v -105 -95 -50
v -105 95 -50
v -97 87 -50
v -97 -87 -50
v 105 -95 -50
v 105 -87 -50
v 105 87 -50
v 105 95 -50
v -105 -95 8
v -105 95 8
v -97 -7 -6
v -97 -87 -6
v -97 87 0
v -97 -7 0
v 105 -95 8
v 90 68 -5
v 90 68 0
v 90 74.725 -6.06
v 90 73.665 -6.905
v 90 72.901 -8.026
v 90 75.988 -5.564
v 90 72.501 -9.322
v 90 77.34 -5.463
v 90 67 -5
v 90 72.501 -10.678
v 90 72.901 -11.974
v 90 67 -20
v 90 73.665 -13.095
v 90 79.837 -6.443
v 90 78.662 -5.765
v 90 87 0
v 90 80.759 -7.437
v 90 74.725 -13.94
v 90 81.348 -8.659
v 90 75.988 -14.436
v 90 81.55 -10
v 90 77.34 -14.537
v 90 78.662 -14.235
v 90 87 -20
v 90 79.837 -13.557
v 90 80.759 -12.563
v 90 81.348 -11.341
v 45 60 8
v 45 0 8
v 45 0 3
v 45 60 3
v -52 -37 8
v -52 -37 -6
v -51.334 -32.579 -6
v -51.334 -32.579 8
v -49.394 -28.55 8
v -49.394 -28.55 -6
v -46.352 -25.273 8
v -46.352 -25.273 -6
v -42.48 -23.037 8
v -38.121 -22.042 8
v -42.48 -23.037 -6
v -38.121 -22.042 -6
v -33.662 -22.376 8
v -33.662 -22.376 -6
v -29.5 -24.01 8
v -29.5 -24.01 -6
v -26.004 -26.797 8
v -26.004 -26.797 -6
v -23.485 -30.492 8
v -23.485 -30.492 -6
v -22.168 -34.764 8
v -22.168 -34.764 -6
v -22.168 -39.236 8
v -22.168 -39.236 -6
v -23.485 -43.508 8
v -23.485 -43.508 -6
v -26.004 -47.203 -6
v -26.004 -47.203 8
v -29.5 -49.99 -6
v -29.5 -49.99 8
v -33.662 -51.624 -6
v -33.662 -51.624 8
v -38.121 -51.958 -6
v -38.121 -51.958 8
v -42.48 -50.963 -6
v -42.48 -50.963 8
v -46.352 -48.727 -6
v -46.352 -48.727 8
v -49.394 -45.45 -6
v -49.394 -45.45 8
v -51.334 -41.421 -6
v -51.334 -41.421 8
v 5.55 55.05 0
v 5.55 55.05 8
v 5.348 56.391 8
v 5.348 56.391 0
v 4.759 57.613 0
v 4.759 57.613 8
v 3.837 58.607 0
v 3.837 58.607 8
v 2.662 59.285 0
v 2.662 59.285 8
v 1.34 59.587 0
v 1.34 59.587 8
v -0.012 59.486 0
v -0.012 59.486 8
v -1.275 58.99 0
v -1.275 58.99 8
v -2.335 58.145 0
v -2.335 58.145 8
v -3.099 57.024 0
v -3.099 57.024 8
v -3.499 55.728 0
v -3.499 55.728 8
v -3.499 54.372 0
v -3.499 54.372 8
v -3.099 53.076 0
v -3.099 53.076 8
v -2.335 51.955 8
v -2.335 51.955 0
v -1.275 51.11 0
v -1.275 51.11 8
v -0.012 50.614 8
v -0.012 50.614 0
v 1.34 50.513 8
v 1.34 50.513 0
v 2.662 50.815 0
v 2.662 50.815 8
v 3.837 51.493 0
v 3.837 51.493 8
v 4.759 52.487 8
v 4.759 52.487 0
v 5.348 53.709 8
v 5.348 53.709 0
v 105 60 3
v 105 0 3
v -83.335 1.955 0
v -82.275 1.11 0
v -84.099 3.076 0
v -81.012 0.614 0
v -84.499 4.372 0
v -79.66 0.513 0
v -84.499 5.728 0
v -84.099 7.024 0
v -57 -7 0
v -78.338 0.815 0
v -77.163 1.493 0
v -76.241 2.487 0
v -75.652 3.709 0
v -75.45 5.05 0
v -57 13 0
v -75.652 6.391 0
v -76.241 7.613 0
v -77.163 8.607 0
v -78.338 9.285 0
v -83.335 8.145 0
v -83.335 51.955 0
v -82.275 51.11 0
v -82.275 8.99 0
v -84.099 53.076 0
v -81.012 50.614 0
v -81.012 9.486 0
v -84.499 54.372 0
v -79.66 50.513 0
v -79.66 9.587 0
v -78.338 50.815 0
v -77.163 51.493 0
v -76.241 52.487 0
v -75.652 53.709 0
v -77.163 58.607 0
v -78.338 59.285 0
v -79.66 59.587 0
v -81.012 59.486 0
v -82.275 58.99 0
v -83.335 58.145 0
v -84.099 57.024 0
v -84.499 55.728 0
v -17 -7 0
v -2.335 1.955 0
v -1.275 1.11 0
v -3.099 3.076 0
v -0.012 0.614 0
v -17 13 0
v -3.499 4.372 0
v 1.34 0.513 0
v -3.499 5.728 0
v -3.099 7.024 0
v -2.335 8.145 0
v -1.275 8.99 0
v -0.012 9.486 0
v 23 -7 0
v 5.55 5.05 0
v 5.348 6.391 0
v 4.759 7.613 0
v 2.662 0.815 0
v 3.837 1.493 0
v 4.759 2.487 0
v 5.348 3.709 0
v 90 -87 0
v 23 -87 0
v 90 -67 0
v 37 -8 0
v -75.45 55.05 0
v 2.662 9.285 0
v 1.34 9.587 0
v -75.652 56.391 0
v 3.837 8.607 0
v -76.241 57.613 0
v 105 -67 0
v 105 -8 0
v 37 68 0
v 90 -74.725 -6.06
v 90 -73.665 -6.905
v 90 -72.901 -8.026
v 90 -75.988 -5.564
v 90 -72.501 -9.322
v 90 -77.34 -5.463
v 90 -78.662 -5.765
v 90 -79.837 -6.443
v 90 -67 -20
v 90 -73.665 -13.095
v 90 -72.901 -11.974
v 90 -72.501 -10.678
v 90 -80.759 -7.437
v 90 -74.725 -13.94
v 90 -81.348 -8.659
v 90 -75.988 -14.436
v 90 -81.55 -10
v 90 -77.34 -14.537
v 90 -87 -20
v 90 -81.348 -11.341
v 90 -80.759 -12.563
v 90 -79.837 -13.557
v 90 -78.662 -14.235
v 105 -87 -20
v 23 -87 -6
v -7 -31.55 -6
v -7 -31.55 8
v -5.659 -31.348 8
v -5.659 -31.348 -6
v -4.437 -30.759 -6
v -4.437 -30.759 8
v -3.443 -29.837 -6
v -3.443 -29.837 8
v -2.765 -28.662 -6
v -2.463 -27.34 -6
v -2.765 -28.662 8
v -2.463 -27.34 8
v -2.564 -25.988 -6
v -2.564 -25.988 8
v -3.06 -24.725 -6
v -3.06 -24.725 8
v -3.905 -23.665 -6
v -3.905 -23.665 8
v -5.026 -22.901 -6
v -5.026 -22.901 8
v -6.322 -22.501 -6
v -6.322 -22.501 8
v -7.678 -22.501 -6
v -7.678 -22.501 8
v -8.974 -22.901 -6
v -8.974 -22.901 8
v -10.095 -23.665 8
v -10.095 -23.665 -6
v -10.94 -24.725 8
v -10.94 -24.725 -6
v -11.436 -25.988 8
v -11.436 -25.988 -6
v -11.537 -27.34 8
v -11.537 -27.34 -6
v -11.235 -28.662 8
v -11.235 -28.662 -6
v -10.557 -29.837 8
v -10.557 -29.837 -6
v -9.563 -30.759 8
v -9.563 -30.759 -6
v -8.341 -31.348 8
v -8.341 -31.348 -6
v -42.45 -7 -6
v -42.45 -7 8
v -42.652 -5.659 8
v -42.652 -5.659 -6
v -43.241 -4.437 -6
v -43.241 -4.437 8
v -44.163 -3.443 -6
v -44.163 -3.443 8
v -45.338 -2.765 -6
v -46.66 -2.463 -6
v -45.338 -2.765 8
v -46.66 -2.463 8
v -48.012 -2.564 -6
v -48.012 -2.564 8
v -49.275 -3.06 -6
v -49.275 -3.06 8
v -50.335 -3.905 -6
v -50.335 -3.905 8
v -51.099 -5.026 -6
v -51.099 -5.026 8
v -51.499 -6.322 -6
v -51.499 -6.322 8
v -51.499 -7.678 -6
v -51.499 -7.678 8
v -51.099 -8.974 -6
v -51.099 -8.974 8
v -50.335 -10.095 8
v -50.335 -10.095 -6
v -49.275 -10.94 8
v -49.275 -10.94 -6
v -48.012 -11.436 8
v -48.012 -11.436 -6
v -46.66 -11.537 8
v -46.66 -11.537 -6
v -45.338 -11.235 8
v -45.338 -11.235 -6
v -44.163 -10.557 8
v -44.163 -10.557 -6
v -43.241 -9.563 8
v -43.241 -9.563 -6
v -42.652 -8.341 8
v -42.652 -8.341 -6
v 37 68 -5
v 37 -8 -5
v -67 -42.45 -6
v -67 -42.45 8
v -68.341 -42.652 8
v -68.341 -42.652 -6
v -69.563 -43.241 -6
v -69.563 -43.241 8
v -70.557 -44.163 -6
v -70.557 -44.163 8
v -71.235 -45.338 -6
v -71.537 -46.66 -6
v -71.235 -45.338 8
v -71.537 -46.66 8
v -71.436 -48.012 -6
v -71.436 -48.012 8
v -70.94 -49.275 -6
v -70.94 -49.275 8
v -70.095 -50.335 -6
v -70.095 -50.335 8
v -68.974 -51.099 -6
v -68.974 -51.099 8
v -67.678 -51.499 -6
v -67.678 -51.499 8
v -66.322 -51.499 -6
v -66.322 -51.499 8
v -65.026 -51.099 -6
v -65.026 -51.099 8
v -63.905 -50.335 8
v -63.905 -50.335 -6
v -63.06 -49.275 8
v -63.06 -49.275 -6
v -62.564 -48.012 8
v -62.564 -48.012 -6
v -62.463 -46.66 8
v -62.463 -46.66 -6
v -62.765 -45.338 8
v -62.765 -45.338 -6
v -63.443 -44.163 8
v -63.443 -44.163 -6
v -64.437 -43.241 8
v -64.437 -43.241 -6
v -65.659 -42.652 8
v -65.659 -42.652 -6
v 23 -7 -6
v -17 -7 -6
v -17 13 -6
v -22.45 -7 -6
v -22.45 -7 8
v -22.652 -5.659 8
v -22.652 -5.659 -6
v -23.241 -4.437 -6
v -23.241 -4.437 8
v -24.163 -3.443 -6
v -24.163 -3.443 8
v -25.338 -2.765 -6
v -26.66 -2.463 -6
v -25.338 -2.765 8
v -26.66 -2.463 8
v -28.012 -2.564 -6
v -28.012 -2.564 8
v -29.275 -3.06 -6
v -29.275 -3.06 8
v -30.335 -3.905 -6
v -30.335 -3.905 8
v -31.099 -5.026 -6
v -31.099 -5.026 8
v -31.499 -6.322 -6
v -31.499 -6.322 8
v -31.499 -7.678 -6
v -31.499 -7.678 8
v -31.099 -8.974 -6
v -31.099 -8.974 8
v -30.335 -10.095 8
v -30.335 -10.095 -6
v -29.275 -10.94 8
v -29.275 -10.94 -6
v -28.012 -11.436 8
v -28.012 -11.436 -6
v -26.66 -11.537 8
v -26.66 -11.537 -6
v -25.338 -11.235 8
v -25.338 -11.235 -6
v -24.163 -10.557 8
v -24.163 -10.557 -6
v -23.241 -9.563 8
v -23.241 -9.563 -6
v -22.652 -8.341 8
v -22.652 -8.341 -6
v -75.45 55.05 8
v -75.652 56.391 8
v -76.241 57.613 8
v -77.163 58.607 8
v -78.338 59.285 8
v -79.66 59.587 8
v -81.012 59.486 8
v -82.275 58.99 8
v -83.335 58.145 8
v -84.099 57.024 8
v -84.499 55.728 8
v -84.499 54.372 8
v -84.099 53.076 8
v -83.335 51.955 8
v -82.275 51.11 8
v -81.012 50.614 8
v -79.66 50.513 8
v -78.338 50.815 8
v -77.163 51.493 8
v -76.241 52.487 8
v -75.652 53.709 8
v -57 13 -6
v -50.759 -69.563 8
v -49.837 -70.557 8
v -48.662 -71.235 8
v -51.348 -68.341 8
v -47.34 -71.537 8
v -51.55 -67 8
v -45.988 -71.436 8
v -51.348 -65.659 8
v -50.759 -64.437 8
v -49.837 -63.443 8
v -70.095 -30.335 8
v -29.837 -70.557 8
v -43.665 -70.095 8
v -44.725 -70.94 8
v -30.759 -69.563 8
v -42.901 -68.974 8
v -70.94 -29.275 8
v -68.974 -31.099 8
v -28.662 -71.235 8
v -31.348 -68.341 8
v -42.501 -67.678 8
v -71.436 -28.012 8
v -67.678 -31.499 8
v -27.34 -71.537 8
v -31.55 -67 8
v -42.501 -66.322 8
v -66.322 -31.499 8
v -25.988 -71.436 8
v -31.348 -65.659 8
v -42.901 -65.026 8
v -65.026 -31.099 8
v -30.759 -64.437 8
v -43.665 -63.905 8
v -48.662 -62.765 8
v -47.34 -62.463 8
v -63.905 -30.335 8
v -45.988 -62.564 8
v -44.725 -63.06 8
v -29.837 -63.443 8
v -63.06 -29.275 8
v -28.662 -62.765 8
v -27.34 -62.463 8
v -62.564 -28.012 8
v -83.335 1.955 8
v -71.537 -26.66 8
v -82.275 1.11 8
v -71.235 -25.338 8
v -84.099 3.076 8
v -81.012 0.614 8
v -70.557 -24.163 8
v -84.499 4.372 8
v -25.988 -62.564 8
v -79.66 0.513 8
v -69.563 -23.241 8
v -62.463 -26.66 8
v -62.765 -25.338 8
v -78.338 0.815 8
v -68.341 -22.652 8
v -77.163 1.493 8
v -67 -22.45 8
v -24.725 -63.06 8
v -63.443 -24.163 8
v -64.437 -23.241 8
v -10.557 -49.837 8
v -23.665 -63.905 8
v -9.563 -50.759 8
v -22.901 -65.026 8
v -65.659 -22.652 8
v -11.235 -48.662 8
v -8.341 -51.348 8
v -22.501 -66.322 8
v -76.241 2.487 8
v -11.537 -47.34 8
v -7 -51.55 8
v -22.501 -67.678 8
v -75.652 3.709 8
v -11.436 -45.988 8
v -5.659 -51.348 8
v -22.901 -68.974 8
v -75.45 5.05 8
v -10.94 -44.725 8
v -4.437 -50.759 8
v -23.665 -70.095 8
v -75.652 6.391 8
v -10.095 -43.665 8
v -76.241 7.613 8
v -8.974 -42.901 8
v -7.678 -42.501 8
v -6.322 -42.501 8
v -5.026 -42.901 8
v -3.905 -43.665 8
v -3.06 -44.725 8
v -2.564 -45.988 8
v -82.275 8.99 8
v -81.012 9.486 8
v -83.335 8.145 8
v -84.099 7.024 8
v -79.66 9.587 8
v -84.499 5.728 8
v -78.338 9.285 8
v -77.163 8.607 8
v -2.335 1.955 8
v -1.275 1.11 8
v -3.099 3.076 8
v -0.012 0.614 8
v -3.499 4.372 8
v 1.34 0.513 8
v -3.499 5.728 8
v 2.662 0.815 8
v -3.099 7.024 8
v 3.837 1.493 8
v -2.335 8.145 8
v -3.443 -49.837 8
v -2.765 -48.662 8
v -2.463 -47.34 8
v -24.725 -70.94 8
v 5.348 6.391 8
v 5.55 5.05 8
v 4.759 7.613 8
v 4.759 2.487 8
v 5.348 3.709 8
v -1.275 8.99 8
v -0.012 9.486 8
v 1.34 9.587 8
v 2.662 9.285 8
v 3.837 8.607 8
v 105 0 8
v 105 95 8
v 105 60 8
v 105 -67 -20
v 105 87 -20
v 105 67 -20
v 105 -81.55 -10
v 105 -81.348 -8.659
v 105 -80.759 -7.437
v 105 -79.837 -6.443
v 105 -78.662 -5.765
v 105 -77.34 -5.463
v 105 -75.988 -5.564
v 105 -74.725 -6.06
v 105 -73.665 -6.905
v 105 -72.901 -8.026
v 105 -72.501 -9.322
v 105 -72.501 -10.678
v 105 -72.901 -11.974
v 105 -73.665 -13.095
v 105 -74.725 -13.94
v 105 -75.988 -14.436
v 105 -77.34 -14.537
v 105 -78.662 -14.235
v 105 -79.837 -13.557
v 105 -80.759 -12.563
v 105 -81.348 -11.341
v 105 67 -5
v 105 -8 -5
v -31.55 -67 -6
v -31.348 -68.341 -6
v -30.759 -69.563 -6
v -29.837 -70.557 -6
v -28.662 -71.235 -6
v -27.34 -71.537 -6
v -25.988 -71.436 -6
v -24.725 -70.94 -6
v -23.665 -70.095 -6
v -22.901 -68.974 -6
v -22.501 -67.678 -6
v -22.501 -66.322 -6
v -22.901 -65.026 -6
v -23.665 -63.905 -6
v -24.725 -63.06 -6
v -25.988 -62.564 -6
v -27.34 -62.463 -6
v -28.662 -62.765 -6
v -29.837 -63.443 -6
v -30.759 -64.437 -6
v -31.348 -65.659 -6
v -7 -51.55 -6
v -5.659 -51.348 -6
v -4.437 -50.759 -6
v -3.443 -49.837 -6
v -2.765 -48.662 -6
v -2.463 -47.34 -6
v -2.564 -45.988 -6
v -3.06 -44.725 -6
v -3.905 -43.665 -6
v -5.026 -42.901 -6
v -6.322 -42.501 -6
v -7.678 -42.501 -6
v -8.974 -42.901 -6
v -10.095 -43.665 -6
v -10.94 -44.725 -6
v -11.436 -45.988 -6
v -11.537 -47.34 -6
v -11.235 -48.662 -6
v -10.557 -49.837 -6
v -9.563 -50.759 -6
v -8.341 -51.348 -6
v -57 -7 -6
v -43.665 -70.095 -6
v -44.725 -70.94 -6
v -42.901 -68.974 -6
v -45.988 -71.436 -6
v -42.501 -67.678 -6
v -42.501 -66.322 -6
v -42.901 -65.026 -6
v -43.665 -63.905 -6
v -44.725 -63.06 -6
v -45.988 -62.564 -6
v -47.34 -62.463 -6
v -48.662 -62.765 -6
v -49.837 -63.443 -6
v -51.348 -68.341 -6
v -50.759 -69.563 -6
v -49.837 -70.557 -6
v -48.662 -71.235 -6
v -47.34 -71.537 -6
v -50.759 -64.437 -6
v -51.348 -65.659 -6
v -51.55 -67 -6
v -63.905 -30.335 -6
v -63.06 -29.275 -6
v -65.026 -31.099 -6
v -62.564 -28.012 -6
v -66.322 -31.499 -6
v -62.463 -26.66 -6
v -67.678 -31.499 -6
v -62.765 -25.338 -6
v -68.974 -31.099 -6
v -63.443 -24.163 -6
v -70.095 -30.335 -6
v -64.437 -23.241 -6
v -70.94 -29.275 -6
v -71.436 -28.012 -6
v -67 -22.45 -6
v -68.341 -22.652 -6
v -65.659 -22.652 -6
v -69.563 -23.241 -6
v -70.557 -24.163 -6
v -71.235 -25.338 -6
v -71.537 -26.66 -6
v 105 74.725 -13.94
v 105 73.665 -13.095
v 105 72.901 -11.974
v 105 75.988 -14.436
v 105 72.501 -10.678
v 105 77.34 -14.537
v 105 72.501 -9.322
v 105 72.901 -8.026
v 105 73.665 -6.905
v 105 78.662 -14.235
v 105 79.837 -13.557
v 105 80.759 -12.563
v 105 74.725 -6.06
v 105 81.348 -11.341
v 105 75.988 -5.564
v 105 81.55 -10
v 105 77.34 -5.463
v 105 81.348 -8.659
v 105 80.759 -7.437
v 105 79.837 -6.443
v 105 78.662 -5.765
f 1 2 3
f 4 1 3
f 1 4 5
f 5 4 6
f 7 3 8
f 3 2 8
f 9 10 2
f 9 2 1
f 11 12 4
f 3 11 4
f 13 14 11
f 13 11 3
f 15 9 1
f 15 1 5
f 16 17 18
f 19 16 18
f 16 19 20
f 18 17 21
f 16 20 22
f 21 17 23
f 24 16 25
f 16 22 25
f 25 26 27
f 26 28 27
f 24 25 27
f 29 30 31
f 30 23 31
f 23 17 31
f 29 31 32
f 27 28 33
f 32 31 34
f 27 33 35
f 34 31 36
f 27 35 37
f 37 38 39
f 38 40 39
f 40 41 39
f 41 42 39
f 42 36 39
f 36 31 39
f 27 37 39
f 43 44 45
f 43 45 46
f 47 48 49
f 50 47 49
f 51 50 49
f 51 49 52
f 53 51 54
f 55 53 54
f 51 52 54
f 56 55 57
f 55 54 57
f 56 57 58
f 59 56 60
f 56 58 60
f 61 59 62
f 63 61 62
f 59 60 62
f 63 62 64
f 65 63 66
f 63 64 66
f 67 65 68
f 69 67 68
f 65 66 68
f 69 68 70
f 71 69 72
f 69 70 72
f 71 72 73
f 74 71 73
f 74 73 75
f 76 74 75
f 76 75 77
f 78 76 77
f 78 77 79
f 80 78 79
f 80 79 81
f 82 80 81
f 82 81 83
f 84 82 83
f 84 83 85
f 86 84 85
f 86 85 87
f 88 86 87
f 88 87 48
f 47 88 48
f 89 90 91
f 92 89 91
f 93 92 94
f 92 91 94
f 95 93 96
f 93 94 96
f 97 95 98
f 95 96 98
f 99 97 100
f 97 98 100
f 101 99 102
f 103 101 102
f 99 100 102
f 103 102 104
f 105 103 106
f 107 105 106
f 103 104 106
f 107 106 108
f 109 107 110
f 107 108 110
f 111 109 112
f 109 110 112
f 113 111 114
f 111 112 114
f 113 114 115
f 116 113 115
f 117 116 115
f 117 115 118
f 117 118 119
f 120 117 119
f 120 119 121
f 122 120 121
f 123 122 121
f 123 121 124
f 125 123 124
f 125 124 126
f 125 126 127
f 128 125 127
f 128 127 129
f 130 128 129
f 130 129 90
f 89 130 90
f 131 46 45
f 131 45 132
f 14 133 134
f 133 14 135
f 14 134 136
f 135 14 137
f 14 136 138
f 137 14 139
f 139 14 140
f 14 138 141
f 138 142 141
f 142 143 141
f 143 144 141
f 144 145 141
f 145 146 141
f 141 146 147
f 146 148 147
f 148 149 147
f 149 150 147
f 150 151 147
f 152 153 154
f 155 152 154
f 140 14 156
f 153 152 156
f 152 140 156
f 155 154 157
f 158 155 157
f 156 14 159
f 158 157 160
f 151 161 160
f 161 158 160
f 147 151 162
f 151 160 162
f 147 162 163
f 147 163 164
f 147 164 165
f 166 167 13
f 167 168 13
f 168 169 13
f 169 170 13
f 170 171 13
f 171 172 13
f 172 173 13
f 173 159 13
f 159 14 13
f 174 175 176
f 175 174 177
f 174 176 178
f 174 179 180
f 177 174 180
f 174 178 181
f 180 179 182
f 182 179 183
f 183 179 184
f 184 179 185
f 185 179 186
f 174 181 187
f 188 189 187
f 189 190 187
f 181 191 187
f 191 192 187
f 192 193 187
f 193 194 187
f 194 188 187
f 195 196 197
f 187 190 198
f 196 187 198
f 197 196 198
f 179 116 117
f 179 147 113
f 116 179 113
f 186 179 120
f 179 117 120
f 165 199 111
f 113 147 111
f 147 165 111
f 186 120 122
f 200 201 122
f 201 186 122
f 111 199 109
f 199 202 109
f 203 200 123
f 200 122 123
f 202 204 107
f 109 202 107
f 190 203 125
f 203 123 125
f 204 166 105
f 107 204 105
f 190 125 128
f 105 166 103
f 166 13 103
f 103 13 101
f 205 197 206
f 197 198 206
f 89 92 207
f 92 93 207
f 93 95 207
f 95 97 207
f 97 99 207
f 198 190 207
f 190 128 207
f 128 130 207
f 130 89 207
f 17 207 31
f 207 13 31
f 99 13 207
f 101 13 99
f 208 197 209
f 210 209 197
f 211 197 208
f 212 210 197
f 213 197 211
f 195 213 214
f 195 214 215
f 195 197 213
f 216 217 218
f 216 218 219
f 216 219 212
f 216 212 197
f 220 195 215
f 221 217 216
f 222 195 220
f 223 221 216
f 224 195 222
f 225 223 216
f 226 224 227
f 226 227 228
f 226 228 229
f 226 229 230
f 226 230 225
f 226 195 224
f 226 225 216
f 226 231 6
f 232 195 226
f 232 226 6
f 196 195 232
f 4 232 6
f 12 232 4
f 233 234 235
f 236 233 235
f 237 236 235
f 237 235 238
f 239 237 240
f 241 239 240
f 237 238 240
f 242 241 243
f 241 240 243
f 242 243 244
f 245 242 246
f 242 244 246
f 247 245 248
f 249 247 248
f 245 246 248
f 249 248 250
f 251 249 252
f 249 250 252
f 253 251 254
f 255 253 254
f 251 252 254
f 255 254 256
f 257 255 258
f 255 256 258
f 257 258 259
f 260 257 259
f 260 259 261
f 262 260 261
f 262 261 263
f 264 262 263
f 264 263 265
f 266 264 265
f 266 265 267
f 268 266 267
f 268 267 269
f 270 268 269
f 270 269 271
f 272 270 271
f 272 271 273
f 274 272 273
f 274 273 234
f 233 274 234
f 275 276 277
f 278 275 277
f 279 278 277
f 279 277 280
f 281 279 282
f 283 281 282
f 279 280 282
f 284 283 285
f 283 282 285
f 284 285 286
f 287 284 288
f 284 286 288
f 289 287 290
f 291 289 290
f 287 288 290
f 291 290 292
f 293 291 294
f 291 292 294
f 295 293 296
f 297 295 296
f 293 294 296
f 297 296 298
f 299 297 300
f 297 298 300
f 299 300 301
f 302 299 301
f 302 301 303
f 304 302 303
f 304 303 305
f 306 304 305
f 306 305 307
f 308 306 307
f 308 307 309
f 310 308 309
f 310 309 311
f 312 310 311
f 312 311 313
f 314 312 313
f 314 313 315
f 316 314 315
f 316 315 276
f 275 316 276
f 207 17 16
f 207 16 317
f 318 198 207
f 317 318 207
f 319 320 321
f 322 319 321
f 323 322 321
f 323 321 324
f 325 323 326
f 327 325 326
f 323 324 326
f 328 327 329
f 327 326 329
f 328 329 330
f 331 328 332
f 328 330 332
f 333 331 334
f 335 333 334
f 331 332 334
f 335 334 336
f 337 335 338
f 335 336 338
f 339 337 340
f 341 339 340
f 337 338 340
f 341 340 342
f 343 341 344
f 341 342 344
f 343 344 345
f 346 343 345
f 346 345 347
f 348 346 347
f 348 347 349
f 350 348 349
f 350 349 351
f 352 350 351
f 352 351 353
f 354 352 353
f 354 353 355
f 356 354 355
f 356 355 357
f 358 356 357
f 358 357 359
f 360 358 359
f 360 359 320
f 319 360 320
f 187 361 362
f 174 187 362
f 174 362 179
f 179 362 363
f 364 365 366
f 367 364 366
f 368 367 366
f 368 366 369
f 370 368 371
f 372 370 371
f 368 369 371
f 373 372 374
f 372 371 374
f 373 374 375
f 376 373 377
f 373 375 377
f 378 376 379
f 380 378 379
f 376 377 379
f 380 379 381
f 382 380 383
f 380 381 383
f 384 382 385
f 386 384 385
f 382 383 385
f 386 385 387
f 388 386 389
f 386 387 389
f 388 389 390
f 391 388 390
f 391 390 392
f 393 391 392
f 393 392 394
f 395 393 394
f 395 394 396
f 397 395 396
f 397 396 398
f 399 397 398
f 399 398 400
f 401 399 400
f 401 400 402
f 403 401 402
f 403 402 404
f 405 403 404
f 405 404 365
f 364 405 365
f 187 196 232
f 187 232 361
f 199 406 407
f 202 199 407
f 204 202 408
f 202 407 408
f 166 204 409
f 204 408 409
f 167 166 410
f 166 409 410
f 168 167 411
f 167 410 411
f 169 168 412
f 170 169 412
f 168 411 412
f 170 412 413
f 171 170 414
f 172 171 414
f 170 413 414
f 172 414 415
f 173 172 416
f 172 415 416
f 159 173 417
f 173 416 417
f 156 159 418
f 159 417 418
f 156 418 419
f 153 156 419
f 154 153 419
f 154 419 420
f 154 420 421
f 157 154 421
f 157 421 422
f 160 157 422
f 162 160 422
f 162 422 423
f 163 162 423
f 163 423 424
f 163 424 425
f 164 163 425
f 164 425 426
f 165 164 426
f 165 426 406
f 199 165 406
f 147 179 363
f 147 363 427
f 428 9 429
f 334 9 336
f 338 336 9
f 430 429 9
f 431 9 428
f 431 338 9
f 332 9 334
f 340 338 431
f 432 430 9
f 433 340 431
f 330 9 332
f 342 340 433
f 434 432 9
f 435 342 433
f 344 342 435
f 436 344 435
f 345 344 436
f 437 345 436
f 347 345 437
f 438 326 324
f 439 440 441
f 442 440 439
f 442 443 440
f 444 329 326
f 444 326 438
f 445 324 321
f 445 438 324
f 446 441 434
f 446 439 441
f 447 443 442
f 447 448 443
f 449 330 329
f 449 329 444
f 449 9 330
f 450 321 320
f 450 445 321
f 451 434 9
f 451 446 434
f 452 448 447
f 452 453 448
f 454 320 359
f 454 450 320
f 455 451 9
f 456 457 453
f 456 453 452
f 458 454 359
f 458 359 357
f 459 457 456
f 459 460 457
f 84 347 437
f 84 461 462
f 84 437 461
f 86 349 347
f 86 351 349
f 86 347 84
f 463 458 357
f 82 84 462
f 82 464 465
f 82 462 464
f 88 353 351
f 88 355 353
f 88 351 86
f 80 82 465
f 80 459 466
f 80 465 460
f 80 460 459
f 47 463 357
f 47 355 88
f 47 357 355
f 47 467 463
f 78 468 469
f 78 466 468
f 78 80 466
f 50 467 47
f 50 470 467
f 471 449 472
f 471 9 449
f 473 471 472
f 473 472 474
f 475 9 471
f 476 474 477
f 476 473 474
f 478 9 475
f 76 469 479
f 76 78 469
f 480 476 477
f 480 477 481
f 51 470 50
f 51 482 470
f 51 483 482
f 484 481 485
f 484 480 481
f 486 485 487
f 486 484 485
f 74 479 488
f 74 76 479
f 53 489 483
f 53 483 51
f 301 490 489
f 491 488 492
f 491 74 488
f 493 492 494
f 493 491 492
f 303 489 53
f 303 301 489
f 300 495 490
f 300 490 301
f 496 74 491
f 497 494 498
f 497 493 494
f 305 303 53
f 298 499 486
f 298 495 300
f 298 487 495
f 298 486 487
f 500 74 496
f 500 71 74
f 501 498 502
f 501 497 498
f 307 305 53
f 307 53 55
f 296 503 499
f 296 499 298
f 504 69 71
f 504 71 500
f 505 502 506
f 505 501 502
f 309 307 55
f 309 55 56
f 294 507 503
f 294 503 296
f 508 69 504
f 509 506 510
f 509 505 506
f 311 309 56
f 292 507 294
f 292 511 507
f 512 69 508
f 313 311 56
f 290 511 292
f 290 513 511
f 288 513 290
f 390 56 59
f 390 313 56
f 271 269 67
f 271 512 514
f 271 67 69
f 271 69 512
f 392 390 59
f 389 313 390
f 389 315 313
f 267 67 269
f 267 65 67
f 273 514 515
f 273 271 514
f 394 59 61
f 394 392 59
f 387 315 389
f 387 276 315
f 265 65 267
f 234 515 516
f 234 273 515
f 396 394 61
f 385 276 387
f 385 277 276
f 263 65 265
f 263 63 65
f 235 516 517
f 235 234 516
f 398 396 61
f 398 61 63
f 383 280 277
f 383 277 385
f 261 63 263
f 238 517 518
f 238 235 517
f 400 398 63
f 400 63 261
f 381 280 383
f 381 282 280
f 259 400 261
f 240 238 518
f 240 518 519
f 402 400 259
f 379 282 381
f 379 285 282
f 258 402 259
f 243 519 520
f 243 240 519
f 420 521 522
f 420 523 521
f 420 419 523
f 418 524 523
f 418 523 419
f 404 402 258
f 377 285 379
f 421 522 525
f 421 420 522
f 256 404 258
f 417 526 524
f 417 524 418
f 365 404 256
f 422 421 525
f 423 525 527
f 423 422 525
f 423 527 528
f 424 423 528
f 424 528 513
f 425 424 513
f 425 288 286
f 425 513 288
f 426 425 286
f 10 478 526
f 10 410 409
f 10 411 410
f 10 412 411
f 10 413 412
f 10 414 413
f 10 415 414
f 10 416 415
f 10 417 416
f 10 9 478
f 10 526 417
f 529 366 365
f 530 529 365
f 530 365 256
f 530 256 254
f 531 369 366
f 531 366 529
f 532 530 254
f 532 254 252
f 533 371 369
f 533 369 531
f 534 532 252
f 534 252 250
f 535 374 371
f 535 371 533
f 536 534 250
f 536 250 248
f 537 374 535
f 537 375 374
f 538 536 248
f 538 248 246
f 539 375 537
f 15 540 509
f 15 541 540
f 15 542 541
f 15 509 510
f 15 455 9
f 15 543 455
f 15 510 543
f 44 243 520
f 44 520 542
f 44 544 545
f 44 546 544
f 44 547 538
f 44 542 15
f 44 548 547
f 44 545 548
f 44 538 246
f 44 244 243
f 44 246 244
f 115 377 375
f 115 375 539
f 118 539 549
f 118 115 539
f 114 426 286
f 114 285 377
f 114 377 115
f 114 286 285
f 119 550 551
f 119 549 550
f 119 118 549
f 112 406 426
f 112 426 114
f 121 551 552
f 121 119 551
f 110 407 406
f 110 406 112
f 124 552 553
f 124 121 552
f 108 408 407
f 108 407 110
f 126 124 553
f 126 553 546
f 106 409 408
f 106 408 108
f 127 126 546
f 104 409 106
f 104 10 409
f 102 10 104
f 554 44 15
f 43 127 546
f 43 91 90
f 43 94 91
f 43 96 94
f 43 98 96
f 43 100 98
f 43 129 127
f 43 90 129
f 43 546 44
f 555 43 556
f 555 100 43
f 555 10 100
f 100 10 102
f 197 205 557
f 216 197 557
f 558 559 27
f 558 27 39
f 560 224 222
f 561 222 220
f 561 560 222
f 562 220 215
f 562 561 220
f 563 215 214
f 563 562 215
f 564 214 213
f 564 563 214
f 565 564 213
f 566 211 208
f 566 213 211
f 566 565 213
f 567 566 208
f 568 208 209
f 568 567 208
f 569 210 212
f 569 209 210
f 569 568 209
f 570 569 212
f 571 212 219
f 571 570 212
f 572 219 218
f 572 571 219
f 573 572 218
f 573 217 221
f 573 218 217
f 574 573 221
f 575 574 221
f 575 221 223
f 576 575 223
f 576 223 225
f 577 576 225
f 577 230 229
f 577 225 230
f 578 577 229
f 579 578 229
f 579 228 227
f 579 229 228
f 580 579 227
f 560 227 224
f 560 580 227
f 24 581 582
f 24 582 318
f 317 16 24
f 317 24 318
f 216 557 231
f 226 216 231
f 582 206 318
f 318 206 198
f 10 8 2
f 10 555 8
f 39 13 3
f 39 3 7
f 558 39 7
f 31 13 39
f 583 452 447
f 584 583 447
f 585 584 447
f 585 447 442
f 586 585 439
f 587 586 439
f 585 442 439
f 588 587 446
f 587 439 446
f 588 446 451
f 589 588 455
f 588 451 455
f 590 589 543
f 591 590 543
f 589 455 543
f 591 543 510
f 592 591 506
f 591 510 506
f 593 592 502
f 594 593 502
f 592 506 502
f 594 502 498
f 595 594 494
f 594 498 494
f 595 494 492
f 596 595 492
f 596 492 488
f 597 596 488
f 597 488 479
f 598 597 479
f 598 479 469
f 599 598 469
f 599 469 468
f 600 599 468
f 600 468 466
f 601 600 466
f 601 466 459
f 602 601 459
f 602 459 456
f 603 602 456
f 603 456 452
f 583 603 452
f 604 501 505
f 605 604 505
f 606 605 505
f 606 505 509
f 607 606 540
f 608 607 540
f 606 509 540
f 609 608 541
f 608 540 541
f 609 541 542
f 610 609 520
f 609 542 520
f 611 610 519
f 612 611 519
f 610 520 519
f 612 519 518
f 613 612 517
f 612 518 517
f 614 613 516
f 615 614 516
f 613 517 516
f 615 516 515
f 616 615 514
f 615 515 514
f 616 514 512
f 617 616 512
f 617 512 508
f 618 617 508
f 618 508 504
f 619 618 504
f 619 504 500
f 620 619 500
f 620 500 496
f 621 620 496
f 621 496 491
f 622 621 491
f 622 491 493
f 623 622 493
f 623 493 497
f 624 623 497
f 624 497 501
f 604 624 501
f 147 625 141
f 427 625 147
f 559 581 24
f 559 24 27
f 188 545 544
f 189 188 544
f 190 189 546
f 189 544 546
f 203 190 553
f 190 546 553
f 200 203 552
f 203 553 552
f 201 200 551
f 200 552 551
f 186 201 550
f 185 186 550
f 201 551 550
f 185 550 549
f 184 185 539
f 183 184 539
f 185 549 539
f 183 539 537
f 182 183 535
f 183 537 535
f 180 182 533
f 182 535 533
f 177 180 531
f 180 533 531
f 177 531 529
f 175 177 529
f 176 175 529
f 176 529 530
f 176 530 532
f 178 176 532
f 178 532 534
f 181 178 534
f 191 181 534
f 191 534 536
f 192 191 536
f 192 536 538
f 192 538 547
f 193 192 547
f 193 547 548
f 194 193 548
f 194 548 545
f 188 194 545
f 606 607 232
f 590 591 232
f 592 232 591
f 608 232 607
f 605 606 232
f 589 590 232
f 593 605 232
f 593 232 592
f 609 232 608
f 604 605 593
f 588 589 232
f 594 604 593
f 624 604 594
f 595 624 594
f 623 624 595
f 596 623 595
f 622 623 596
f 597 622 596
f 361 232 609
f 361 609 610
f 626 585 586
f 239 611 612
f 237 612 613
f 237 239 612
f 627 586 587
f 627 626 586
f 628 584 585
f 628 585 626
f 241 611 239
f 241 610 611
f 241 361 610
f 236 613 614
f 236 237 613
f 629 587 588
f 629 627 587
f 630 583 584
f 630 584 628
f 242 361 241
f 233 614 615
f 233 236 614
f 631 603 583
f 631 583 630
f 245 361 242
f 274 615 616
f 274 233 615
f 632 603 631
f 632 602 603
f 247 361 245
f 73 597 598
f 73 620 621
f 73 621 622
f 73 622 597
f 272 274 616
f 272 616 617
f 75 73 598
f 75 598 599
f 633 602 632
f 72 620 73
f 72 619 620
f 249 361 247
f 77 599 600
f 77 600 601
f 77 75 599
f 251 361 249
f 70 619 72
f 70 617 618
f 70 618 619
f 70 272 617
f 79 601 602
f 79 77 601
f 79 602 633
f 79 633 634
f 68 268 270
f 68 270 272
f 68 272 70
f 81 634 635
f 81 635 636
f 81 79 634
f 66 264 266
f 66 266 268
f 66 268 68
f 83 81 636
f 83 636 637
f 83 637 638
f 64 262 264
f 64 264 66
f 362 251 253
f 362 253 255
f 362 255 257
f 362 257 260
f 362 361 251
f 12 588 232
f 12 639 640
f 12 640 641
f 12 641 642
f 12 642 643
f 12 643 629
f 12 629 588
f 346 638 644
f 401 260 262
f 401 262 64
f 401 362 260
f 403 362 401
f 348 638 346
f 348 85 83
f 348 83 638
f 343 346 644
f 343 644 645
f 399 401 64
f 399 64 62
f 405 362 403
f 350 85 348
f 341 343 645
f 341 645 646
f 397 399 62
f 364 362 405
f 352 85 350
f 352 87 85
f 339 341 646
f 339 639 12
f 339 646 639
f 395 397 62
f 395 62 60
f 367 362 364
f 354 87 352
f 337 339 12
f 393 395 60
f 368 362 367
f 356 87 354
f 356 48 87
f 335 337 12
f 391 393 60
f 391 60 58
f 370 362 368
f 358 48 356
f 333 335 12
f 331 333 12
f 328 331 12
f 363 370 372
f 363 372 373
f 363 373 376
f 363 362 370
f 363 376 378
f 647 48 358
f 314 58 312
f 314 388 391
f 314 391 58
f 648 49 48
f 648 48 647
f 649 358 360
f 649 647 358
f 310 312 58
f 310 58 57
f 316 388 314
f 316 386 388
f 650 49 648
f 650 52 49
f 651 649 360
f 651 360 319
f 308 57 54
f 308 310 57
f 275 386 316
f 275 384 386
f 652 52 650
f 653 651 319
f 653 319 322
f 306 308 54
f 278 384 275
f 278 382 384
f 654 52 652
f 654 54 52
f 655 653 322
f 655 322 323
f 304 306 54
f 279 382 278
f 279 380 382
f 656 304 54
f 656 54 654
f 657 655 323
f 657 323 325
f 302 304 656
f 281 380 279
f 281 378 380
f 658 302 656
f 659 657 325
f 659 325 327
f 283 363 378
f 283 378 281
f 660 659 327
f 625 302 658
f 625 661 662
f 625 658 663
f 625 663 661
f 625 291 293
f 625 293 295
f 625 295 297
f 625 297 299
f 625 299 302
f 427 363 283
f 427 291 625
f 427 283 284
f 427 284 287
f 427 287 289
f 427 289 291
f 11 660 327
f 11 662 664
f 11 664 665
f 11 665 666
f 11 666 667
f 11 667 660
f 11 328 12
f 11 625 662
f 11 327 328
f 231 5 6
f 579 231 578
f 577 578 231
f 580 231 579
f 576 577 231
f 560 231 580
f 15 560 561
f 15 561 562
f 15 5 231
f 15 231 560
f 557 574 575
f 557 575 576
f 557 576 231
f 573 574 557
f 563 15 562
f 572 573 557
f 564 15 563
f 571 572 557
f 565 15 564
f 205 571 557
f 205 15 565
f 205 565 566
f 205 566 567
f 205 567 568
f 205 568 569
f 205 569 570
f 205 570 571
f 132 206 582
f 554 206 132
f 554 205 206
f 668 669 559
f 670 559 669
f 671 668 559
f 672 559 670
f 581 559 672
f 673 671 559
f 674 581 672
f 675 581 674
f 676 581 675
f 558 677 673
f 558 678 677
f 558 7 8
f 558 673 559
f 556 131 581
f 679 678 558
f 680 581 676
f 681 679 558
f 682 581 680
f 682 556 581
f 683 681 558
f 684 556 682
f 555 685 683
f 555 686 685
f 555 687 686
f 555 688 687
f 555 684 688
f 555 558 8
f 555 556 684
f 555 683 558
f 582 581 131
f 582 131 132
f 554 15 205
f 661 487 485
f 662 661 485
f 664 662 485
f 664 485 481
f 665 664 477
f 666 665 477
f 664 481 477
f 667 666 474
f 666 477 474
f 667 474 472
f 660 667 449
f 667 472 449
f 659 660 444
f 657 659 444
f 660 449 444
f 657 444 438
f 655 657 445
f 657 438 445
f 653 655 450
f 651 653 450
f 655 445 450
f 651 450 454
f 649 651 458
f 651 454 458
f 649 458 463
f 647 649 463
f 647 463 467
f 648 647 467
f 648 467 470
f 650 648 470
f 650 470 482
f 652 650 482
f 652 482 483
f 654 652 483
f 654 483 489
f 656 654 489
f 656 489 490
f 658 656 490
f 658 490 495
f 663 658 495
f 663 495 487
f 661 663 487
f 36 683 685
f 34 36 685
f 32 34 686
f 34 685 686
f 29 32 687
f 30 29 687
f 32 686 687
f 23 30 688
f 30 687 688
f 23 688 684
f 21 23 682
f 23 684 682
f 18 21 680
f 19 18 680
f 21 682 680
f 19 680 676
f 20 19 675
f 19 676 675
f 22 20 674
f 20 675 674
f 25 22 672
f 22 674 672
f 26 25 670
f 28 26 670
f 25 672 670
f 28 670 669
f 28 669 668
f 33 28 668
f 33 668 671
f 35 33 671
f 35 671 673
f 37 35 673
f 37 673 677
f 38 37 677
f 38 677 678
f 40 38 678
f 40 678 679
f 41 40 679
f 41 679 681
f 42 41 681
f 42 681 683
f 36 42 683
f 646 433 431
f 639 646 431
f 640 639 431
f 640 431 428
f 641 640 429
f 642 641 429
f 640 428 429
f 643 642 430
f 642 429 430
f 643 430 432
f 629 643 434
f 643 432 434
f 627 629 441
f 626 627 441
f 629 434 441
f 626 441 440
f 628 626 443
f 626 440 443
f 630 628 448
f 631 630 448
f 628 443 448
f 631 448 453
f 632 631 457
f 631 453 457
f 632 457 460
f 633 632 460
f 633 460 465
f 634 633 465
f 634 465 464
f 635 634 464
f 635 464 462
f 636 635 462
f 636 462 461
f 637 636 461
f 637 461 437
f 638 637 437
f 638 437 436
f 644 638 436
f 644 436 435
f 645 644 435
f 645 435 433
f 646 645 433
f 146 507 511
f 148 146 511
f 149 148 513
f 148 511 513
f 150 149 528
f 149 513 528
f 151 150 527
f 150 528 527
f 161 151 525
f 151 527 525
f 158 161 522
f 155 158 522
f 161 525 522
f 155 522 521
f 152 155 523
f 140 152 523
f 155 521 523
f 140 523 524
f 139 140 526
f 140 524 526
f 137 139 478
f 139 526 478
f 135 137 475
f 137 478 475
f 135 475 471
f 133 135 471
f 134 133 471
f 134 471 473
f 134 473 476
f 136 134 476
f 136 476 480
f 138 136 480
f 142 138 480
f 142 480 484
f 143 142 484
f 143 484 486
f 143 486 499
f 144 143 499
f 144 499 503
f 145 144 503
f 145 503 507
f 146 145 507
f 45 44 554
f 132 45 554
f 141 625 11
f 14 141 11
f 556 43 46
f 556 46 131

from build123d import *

# Parameters (mm, degrees)
SKETCH_1_W               = 210
SKETCH_1_H               = 190
EXTRUDE_1_DEPTH          = 8
EXTRUDE_2_DEPTH          = 50
SKETCH_3_W               = 20
SKETCH_3_H               = 20
EXTRUDE_3_DEPTH          = 15
SKETCH_8_R               = 4.55
CUT_EXTRUDE_1_DEPTH      = 25
SKETCH_9_W               = 120
SKETCH_9_H               = 100
EXTRUDE_4_DEPTH          = 12
SKETCH_10_R              = 15
CUT_EXTRUDE_2_DEPTH      = 147.608321728
SKETCH_13_R              = 4.55
CUT_EXTRUDE_3_DEPTH      = 154.016338997
PATTERN_CIRCULAR_2_COUNT = 4
SKETCH_14_W              = 120
SKETCH_14_H              = 100
CUT_EXTRUDE_4_DEPTH      = 6
SKETCH_15_W              = 68
SKETCH_15_H              = 76
EXTRUDE_5_DEPTH          = 5
SKETCH_16_W              = 60
SKETCH_16_H              = 60
CUT_EXTRUDE_5_DEPTH      = 5
SKETCH_17_R              = 4.55
CUT_EXTRUDE_6_DEPTH      = 154.016338997
SKETCH_18_W              = 40
SKETCH_18_H              = 20
CUT_EXTRUDE_7_DEPTH      = 6


with BuildPart() as part:
    # 스케치1 → 보스-돌출1 (new body)
    with BuildSketch(Plane.XY):
        Rectangle(SKETCH_1_W, SKETCH_1_H)
    extrude(amount=EXTRUDE_1_DEPTH)

    # 스케치2 → 보스-돌출2 (add)
    with BuildSketch(Plane(origin=(0, 0, 0), x_dir=(-1, 0, 0), z_dir=(0, 0, -1))):
        Polygon((-105, 95), (105, 95), (105, -95), (-105, -95), (-105, -87), (97, -87), (97, 87), (-105, 87), align=None)
    extrude(amount=EXTRUDE_2_DEPTH)

    # 스케치3 → 보스-돌출3 (add)
    with BuildSketch(Plane(origin=(105, 0, 0), x_dir=(0, 0, -1), z_dir=(1, 0, 0))):
        with Locations((10, 77)):
            Rectangle(SKETCH_3_W, SKETCH_3_H)
    extrude_3 = extrude(amount=-EXTRUDE_3_DEPTH)

    # 스케치8 → 컷-돌출1 (cut)
    with BuildSketch(Plane(origin=(105, 0, 0), x_dir=(0, 0, -1), z_dir=(1, 0, 0))):
        with Locations(Location((10, 77, 0), (0, 0, 90))):
            Circle(SKETCH_8_R)
    cut_extrude_1 = extrude(amount=-CUT_EXTRUDE_1_DEPTH, mode=Mode.SUBTRACT)

    # 대칭 복사1: 보스-돌출3, 컷-돌출1 across plane
    add(extrude_3.mirror(Plane(origin=(0, 0, 0), x_dir=(0, 0, 1), z_dir=(0, -1, 0))))
    add(cut_extrude_1.mirror(Plane(origin=(0, 0, 0), x_dir=(0, 0, 1), z_dir=(0, -1, 0))), mode=Mode.SUBTRACT)

    # 스케치9 → 보스-돌출4 (add)
    with BuildSketch(Plane(origin=(0, 0, 0), x_dir=(-1, 0, 0), z_dir=(0, 0, -1))):
        with Locations((37, -37)):
            Rectangle(SKETCH_9_W, SKETCH_9_H)
    extrude(amount=EXTRUDE_4_DEPTH)

    # 스케치10 → 컷-돌출2 (cut, through all)
    with BuildSketch(Plane(origin=(0, 0, -12), x_dir=(-1, 0, 0), z_dir=(0, 0, -1))):
        with Locations((37, -37)):
            Circle(SKETCH_10_R)
    extrude(amount=-CUT_EXTRUDE_2_DEPTH, mode=Mode.SUBTRACT)

    # 스케치13 → 컷-돌출3 (cut, through all)
    with BuildSketch(Plane.XY.offset(8)):
        with Locations((-47, -7)):
            Circle(SKETCH_13_R)
        with Locations((-27, -7)):
            Circle(SKETCH_13_R)
    cut_extrude_3 = extrude(amount=-CUT_EXTRUDE_3_DEPTH, mode=Mode.SUBTRACT)

    # 원형 패턴2: 컷-돌출3 ×4 about axis
    pattern_circular_2_axis = Axis((-37, -37, 0), (0, 0, 1))
    for i in range(1, PATTERN_CIRCULAR_2_COUNT):
        add(cut_extrude_3.rotate(pattern_circular_2_axis, i * 360 / PATTERN_CIRCULAR_2_COUNT), mode=Mode.SUBTRACT)

    # 스케치14 → 컷-돌출4 (cut)
    with BuildSketch(Plane(origin=(0, 0, -12), x_dir=(-1, 0, 0), z_dir=(0, 0, -1))):
        with Locations((37, -37)):
            Rectangle(SKETCH_14_W, SKETCH_14_H)
    extrude(amount=-CUT_EXTRUDE_4_DEPTH, mode=Mode.SUBTRACT)

    # 스케치15 → 보스-돌출5 (add)
    with BuildSketch(Plane(origin=(0, 0, 0), x_dir=(-1, 0, 0), z_dir=(0, 0, -1))):
        with Locations((-71, 30)):
            Rectangle(SKETCH_15_W, SKETCH_15_H)
    extrude(amount=EXTRUDE_5_DEPTH)

    # 스케치16 → 컷-돌출5 (cut)
    with BuildSketch(Plane.XY.offset(8)):
        with Locations((75, 30)):
            Rectangle(SKETCH_16_W, SKETCH_16_H)
    extrude(amount=-CUT_EXTRUDE_5_DEPTH, mode=Mode.SUBTRACT)

    # 스케치17 → 컷-돌출6 (cut, through all)
    with BuildSketch(Plane.XY.offset(8)):
        with Locations((1, 5.05)):
            Circle(SKETCH_17_R)
        with Locations((-80, 5.05)):
            Circle(SKETCH_17_R)
        with Locations((-80, 55.05)):
            Circle(SKETCH_17_R)
        with Locations((1, 55.05)):
            Circle(SKETCH_17_R)
    extrude(amount=-CUT_EXTRUDE_6_DEPTH, mode=Mode.SUBTRACT)

    # 스케치18 → 컷-돌출7 (cut)
    with BuildSketch(Plane(origin=(0, 0, -6), x_dir=(-1, 0, 0), z_dir=(0, 0, -1))):
        with Locations((-3, 3)):
            Rectangle(SKETCH_18_W, SKETCH_18_H)
        with Locations((77, 3)):
            Rectangle(SKETCH_18_W, SKETCH_18_H)
    extrude(amount=-CUT_EXTRUDE_7_DEPTH, mode=Mode.SUBTRACT)


solid = part.part
